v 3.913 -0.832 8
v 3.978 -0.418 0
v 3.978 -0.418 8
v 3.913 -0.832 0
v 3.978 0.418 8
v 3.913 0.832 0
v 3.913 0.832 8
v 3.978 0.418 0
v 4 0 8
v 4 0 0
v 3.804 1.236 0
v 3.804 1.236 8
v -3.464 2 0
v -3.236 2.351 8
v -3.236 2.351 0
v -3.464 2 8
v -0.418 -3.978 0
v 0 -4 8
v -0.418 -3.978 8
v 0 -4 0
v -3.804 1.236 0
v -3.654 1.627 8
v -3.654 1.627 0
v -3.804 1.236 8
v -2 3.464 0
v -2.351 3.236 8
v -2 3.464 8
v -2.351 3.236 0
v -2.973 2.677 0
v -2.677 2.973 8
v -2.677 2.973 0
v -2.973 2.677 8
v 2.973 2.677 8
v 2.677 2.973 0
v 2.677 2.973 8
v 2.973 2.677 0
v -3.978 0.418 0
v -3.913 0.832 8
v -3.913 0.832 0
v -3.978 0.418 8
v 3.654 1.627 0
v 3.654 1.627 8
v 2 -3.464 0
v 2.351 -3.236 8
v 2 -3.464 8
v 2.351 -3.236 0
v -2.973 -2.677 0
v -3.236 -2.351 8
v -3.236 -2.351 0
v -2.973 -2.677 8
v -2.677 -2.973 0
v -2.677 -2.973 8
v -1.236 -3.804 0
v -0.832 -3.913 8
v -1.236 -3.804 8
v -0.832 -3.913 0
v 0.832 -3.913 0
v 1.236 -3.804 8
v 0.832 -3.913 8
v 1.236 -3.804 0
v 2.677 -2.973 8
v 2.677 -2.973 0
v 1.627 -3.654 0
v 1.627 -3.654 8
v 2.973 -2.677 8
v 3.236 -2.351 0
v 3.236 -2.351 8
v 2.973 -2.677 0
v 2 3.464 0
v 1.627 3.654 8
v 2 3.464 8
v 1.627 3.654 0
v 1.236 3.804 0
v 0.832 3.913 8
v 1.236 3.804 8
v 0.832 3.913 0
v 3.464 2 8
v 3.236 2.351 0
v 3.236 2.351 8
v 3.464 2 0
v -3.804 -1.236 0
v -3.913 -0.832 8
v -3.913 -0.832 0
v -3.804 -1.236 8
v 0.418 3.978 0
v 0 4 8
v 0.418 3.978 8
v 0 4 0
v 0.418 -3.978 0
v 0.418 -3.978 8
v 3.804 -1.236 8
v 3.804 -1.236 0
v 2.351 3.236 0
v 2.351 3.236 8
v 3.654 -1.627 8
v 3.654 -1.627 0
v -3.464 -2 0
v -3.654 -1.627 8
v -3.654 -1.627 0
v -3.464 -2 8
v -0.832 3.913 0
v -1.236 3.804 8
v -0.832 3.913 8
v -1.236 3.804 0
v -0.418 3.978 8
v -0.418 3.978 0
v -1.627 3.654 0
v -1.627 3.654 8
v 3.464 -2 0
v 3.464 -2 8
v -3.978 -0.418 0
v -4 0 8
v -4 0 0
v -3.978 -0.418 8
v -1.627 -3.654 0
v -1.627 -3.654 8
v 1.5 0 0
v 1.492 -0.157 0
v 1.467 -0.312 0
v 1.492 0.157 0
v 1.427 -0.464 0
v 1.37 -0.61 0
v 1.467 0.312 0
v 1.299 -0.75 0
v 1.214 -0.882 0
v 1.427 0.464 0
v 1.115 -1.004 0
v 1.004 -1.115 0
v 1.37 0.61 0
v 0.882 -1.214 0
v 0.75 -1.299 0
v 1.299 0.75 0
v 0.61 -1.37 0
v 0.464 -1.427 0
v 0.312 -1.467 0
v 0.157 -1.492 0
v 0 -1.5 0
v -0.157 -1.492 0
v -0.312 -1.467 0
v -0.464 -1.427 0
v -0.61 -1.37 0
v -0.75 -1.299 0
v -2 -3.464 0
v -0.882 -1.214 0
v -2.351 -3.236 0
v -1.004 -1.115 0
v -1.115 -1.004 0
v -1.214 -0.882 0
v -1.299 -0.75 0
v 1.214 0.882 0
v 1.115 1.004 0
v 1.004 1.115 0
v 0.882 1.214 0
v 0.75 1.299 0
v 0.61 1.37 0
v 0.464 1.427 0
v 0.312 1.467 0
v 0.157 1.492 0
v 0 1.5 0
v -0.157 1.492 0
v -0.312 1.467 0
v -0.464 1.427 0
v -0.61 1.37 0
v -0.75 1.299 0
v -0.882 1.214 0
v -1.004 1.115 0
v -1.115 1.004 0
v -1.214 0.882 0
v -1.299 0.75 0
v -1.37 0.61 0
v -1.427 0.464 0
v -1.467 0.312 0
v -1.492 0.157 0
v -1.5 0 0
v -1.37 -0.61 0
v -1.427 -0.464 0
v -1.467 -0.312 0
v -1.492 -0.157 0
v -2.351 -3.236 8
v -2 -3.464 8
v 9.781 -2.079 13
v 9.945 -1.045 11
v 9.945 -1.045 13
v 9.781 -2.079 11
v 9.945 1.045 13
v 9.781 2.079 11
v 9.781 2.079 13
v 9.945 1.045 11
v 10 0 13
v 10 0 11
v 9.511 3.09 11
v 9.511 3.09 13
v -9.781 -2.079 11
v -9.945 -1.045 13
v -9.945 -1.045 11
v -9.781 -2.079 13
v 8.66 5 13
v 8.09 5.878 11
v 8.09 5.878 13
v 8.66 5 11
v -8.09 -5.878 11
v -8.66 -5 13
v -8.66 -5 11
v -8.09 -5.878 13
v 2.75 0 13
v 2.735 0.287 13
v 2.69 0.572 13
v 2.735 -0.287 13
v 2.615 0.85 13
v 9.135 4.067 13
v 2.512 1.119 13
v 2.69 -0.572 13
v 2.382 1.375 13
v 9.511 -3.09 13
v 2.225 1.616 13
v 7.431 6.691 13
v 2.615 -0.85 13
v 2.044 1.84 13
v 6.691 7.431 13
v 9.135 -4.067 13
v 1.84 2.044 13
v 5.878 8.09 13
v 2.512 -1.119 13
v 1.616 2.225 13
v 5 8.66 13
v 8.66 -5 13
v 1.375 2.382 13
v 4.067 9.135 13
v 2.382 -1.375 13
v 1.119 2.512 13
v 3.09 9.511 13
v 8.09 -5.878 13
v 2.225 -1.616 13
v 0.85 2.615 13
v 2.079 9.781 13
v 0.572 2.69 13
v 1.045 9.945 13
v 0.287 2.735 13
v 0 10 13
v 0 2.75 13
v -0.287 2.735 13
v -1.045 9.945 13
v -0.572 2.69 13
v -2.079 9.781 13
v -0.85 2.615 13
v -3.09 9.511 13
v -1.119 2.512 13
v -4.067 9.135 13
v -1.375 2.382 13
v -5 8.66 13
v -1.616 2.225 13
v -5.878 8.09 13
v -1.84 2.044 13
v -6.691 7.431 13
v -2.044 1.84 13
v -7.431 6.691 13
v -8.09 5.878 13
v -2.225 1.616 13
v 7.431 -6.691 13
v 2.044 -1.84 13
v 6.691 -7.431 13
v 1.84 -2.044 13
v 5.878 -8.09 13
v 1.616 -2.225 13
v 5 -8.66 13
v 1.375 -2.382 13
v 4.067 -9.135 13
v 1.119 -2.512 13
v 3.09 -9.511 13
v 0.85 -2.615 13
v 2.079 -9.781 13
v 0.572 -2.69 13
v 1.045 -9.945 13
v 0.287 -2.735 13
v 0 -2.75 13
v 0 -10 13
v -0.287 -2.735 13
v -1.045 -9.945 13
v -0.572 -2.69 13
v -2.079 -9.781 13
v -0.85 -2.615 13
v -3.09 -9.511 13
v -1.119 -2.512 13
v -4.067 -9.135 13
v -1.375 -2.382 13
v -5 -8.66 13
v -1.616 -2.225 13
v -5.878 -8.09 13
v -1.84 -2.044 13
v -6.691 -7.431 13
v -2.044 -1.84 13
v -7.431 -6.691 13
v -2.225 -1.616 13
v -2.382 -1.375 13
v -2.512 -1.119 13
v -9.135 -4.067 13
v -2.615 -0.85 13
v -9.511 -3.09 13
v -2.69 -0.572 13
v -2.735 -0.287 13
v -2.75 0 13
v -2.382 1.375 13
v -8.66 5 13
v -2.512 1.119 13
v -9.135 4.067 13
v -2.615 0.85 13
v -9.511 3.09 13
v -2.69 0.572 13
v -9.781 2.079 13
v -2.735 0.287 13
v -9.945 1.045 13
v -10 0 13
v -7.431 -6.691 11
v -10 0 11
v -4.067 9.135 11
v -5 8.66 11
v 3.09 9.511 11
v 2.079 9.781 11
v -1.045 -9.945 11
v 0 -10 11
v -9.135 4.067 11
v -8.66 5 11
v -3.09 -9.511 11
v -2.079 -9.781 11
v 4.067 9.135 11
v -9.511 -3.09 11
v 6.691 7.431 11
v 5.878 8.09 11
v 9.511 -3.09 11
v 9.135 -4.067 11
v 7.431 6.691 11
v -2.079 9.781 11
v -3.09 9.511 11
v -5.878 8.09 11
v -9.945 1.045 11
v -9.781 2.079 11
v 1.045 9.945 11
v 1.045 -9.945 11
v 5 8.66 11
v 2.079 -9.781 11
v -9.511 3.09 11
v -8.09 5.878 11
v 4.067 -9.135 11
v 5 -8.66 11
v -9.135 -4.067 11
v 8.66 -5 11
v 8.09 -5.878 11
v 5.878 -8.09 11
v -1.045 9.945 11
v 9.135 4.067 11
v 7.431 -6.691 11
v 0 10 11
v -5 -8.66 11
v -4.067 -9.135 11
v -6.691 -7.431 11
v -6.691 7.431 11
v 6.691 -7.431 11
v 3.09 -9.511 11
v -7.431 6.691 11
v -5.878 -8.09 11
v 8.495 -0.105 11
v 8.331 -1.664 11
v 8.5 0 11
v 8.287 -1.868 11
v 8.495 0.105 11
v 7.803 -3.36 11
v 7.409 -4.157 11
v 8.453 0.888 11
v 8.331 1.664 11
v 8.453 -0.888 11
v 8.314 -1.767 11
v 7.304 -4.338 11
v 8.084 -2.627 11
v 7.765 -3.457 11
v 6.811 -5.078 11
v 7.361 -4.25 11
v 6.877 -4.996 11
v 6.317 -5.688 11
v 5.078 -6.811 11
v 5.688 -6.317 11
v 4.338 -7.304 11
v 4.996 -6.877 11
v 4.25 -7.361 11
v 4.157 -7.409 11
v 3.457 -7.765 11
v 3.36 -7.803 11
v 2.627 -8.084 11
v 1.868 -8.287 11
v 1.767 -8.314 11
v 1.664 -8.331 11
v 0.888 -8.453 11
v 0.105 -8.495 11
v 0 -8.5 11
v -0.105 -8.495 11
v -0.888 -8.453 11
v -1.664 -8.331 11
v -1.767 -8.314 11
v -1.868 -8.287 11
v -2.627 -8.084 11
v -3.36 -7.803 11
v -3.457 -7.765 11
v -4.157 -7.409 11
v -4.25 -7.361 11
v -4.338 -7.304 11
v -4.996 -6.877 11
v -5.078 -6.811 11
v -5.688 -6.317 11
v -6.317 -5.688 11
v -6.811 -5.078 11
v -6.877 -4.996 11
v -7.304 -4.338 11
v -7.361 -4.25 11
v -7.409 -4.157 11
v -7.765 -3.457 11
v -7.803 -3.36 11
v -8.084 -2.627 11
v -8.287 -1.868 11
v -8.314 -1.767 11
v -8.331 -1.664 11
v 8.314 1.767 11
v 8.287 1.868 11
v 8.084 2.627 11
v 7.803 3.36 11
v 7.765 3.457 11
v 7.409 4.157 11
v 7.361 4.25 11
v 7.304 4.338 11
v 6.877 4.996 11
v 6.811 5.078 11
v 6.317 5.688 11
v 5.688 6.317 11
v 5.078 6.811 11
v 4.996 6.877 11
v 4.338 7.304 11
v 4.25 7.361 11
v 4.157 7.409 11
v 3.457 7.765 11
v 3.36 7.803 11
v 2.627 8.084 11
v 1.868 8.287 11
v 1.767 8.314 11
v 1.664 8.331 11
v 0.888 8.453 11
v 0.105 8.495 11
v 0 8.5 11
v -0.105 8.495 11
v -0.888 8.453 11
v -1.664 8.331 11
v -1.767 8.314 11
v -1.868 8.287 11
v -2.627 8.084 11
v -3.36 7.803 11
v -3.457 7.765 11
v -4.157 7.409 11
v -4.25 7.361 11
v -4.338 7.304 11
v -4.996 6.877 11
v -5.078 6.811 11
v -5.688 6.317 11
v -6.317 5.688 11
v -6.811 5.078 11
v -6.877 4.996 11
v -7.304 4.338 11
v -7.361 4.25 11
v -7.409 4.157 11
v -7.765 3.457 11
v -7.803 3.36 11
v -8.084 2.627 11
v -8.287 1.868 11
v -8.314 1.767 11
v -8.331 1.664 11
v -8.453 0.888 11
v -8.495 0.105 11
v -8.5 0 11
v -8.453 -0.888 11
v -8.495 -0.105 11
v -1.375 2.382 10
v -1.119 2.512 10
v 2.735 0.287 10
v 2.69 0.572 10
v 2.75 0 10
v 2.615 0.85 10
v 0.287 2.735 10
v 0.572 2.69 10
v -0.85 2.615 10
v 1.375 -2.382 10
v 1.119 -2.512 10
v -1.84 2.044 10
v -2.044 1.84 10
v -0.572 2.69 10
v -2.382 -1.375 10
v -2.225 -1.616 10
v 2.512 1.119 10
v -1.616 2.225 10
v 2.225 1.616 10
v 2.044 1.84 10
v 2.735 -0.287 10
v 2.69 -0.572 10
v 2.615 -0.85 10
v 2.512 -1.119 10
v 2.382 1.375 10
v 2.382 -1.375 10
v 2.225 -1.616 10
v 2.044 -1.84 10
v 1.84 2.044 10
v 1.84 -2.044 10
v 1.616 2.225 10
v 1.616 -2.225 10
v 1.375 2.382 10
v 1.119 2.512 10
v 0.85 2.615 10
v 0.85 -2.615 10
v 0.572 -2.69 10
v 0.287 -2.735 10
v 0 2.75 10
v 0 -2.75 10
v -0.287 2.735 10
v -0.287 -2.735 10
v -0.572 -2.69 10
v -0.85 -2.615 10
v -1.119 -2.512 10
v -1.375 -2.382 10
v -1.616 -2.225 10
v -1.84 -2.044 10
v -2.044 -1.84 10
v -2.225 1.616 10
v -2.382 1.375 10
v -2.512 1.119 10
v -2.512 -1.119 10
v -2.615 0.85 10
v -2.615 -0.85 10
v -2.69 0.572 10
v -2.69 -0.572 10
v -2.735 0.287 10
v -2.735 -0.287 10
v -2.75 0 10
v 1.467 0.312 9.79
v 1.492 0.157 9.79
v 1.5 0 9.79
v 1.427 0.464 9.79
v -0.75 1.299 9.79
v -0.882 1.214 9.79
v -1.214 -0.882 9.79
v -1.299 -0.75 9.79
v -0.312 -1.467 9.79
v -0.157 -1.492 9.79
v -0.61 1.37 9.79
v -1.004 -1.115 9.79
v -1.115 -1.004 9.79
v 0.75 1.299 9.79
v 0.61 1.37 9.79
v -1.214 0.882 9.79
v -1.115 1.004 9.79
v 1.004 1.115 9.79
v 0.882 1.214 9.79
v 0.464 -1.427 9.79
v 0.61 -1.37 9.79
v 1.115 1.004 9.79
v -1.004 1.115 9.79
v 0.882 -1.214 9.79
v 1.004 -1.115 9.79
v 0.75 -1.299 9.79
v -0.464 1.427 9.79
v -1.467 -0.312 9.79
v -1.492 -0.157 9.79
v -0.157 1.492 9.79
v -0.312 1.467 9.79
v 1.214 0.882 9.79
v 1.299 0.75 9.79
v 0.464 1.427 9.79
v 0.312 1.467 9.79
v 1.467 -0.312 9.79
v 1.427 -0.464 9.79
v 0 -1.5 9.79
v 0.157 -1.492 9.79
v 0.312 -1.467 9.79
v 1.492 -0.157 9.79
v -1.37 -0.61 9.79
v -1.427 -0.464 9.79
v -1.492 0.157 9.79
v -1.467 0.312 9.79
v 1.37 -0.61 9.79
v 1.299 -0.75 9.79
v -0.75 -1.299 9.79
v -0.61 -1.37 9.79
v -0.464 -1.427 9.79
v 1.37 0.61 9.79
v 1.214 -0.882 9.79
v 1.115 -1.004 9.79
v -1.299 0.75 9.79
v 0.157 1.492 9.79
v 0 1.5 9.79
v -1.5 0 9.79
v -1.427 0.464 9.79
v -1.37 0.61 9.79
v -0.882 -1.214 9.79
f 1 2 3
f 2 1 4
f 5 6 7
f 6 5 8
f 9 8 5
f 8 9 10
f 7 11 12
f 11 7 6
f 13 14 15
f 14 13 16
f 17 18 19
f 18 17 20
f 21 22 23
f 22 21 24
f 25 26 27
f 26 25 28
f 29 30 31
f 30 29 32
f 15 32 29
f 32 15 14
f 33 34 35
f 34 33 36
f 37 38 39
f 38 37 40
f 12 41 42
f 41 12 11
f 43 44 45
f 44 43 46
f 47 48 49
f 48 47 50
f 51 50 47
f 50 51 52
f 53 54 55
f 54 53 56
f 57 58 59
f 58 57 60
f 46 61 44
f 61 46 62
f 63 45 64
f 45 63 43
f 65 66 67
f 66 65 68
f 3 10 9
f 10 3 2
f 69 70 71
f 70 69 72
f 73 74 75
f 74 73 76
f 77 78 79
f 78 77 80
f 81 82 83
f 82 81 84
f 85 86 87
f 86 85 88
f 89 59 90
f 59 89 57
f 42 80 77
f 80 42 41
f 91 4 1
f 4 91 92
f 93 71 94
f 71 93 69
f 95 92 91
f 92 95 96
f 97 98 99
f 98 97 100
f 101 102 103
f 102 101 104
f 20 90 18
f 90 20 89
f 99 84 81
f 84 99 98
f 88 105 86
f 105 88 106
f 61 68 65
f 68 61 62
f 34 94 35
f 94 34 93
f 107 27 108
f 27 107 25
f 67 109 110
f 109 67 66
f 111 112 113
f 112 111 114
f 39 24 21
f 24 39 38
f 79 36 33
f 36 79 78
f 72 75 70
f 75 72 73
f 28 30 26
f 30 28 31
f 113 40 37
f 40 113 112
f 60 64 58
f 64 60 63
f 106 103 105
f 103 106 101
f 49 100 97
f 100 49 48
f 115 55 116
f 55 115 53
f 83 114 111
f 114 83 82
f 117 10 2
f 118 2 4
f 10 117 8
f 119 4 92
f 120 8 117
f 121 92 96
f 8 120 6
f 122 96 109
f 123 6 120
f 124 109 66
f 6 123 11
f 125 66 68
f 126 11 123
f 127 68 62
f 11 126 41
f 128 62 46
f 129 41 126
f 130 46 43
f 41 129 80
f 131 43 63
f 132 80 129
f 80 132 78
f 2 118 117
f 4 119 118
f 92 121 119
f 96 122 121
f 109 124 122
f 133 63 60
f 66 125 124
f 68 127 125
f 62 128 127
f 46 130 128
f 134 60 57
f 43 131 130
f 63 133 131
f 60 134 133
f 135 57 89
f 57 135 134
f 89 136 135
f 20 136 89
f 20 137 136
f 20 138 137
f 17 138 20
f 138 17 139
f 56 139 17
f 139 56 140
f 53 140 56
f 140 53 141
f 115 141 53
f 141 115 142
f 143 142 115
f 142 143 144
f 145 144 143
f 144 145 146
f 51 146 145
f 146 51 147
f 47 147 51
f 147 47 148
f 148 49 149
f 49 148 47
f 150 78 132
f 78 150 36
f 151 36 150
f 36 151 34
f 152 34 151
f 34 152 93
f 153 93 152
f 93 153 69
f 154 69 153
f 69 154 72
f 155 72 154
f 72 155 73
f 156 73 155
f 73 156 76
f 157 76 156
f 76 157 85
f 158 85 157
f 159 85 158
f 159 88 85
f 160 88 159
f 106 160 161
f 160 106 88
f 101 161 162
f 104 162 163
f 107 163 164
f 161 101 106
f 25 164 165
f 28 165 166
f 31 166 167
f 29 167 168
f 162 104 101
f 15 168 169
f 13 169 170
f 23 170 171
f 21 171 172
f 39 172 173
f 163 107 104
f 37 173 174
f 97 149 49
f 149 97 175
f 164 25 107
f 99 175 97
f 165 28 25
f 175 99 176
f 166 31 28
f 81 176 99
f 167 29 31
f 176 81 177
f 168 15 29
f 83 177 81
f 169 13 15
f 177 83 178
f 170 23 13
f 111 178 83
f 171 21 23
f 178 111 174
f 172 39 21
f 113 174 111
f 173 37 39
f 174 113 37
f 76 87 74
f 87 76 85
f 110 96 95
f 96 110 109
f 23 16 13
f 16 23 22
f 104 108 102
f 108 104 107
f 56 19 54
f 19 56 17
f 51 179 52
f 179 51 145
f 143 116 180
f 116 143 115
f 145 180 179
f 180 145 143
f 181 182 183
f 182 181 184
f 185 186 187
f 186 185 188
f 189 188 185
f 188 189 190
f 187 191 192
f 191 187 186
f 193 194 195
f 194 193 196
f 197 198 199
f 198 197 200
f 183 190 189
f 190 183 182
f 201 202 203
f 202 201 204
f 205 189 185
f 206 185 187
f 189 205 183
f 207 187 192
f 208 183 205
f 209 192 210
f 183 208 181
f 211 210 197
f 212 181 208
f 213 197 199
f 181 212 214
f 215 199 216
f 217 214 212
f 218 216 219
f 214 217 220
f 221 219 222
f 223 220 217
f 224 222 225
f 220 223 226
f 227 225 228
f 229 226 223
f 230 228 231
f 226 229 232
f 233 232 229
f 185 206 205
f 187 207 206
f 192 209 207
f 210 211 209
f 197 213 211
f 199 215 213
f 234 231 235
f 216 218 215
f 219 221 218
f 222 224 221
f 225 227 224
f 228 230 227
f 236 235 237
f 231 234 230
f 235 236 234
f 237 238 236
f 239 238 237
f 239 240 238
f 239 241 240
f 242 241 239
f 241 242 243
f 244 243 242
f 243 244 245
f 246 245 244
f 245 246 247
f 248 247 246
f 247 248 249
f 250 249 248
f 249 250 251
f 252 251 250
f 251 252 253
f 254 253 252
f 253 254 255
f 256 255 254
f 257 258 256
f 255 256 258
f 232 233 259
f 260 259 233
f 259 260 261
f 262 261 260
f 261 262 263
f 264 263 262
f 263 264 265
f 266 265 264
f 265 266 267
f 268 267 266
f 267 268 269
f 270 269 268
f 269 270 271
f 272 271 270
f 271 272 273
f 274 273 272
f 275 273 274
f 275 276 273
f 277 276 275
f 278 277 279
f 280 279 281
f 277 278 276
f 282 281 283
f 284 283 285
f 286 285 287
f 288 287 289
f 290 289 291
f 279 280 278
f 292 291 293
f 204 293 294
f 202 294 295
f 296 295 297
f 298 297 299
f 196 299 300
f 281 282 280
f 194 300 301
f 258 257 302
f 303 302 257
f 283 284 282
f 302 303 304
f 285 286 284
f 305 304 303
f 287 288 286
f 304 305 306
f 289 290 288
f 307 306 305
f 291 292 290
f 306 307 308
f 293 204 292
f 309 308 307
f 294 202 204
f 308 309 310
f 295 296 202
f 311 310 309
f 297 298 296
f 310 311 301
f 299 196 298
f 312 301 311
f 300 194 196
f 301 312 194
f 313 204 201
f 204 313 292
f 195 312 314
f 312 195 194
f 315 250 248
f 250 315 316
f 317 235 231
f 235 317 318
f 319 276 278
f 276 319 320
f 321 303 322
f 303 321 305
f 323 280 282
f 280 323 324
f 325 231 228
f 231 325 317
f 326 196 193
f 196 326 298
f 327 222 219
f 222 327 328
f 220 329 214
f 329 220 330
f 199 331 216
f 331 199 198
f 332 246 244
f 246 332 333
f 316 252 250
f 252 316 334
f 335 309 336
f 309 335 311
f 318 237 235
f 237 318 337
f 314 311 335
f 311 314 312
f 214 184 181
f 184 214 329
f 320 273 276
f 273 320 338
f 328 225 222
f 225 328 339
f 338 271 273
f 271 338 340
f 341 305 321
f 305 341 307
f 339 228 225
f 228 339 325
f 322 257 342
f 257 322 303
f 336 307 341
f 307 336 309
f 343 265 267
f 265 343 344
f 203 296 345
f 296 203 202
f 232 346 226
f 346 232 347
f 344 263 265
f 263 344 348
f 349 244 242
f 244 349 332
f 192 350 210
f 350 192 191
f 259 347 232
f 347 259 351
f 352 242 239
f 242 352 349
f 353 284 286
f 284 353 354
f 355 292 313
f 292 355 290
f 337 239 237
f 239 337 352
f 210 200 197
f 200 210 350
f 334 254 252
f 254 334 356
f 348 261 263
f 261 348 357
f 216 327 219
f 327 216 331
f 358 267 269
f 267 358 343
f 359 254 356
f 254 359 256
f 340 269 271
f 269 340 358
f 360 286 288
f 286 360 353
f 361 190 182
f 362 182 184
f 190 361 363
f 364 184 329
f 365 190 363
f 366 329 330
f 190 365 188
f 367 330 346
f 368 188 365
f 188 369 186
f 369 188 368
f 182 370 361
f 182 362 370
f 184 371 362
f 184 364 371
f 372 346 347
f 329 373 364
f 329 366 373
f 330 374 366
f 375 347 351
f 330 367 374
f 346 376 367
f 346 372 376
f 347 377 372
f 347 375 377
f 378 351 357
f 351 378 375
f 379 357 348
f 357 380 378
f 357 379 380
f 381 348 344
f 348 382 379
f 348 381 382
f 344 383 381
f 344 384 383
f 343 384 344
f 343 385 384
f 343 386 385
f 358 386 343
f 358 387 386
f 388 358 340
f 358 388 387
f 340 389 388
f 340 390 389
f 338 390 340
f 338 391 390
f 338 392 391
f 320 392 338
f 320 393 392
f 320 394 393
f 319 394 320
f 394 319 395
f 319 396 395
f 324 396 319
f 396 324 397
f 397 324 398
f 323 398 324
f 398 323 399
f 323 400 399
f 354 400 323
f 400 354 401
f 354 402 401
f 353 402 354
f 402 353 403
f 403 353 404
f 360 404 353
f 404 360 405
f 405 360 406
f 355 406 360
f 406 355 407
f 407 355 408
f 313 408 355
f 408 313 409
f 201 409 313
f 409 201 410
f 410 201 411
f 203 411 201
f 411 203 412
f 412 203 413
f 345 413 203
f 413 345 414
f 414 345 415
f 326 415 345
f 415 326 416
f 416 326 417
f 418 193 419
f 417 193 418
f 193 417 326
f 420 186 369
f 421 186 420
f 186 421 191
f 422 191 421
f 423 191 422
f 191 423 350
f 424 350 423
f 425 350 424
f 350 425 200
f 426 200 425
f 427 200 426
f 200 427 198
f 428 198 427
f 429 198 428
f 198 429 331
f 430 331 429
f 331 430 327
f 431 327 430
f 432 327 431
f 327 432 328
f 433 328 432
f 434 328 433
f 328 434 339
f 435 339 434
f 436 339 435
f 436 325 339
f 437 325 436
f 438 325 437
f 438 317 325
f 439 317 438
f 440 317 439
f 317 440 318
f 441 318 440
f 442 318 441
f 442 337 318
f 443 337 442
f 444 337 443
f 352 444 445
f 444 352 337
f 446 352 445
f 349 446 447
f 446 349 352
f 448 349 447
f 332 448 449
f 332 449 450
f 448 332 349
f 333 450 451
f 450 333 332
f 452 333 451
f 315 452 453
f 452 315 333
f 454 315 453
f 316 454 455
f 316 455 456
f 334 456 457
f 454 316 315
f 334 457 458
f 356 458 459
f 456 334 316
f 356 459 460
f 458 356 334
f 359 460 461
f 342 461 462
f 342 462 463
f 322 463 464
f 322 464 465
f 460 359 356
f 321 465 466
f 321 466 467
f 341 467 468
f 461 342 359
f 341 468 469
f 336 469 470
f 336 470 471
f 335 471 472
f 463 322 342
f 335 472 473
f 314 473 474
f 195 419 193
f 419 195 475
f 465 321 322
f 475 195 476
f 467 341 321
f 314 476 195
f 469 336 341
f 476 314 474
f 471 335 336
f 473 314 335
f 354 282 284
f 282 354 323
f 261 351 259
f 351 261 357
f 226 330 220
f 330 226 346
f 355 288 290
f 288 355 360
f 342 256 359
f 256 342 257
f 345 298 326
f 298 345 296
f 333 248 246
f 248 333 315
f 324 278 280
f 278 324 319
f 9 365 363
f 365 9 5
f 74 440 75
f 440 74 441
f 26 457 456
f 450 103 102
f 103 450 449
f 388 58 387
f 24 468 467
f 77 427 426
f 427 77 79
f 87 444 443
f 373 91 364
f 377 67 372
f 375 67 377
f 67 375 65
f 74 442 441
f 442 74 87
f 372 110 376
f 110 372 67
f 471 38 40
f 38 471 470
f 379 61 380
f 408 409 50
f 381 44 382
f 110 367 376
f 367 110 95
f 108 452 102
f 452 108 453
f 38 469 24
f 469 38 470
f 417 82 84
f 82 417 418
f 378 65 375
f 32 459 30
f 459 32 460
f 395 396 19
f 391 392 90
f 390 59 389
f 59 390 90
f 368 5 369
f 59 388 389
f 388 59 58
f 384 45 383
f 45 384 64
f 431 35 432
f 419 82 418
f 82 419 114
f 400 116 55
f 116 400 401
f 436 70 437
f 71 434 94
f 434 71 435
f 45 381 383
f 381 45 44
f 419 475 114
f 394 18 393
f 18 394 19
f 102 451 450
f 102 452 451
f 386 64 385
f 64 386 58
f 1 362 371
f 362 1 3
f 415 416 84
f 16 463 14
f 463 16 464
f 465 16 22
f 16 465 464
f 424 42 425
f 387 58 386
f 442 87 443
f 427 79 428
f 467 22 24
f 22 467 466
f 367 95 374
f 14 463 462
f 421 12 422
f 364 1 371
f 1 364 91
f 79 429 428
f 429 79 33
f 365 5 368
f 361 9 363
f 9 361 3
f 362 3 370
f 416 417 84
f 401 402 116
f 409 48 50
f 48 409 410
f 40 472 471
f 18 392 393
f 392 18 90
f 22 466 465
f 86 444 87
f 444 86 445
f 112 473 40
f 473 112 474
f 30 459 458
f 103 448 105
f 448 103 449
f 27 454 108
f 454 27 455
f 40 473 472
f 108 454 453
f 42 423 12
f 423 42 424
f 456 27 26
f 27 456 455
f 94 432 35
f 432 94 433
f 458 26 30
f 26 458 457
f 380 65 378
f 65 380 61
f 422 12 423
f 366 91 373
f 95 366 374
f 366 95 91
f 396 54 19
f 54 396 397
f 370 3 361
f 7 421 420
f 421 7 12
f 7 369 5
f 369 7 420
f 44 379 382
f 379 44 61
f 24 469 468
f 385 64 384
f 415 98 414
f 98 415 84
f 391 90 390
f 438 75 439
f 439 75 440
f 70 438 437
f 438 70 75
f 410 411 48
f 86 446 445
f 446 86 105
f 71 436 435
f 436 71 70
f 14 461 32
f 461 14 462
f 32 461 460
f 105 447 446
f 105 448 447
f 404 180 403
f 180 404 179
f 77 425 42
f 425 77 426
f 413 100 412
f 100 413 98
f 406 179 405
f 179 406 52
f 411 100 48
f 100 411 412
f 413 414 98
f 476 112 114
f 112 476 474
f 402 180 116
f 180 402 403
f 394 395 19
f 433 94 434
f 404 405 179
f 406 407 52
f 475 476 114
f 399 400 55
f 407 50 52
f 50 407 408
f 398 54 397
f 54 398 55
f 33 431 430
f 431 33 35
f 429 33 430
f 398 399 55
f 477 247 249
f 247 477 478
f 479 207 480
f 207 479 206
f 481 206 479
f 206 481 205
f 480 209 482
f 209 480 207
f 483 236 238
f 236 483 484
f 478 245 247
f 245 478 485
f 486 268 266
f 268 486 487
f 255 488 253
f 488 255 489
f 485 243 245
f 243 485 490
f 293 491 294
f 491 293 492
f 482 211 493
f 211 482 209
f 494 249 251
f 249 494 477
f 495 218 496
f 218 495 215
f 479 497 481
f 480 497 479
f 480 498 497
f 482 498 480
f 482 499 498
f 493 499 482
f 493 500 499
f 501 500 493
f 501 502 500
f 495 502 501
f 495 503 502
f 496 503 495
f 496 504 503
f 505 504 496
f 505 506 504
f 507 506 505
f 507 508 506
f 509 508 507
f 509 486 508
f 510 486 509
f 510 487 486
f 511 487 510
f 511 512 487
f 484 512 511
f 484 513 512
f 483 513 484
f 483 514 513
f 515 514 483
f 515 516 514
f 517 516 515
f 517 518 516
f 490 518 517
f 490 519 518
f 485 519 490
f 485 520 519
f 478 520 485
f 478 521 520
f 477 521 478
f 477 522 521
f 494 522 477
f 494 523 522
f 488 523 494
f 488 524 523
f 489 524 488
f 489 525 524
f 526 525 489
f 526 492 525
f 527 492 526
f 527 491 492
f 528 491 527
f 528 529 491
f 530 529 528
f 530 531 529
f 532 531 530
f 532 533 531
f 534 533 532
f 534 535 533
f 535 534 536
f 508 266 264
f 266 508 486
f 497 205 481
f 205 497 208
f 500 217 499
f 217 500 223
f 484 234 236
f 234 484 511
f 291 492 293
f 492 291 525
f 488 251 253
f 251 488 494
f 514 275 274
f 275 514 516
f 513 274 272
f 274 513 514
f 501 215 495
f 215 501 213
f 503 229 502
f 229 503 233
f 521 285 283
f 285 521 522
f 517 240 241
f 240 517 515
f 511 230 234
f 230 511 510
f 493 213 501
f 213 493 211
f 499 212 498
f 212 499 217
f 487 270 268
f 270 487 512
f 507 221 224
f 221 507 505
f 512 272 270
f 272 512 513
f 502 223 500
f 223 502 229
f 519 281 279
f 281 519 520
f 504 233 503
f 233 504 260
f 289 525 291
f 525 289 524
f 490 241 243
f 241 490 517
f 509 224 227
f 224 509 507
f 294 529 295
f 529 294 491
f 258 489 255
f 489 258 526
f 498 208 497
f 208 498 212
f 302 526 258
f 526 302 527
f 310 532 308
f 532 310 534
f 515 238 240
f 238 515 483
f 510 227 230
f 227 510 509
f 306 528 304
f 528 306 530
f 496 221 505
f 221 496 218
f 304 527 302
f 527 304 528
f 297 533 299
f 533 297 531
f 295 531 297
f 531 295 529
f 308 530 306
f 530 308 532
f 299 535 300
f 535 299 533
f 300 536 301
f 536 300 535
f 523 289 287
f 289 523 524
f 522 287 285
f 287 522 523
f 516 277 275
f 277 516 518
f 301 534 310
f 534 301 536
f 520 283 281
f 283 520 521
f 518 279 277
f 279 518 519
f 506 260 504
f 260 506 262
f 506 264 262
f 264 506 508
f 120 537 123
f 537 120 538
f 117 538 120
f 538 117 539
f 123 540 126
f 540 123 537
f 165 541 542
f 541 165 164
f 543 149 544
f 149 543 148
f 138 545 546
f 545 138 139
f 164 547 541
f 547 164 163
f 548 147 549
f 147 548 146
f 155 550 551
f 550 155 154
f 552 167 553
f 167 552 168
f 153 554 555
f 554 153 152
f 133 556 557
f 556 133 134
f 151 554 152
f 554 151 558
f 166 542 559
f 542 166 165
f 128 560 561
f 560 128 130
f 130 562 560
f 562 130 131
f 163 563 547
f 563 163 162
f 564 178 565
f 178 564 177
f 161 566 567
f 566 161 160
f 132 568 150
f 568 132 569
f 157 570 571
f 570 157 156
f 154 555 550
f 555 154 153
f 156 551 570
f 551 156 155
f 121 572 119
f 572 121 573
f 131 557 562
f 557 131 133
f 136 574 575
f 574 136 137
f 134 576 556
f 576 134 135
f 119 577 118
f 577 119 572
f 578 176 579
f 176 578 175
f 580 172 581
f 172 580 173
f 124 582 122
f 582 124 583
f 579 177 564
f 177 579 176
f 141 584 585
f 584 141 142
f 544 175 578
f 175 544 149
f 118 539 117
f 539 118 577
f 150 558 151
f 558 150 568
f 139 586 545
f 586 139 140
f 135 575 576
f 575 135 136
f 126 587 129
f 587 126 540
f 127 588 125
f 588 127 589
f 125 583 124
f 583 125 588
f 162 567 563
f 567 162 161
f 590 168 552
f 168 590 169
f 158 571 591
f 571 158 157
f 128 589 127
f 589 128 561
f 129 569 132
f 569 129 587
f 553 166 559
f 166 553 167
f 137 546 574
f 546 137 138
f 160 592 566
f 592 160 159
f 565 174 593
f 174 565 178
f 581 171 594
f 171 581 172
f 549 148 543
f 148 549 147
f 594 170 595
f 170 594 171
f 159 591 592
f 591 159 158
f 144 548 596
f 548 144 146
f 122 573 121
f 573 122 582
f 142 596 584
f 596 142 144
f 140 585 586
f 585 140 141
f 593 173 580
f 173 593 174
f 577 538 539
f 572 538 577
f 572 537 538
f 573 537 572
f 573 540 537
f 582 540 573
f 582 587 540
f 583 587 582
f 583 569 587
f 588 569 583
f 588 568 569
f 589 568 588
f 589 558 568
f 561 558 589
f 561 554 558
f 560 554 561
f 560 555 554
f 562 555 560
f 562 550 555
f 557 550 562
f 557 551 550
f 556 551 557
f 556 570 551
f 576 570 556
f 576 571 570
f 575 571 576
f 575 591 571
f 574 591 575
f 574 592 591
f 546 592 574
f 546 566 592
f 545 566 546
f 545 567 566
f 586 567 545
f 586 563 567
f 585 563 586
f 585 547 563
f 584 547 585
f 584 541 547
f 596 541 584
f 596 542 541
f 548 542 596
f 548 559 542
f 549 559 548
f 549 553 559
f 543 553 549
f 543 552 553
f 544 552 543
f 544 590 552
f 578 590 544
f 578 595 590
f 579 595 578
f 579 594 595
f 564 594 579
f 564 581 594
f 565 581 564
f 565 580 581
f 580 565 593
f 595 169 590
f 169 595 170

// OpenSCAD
//import("D:/OneDrive/Identity/AS/autonomus-only-logo.svg",center=true,96);
module logo(h) {
  a=0.16;
scale([a,a,1])linear_extrude(height=h)translate([8,3])import("d:\\Downloads\\autonomus-only-logo-_1_.svg",center=true );
}
module logo2(h) {
  a=0.16;
  minkowski() {  
scale([a,a,1])linear_extrude(height=h-2)translate([8,3])
    import("d:\\Downloads\\autonomus-only-logo-_1_.svg",center=true );
    cylinder(d1=0.5,d2=0,h=2);
  }
}

module logo_blees(h) {
  b=5.0;
  w=0.9;
  mirror([1,0])minkowski() {  
  scale([b,b,1])linear_extrude(height=h-2)translate([-2.3,-2.3])
    union() {
      translate([0,0])square([4.9,w]);
      translate([2.3,2.4])square([2.6,w]);
      translate([2.3,2.4])square([w,2.5]);
      translate([0,4])square([2.5,w]);
      translate([4,0])square([w,2.5]);
    }
    cylinder(d1=0.5,d2=0,h=2);
  }
}

module stamp_as() {
  difference() {
    union() {
      rotate([0,0,45/2])cylinder(d=50,h=5,$fn=8);
      logo(7);
    }
    translate([0,0,-.01])cylinder(d=2.7,h=4.5,$fn=24);
  }
}
module case() {
  difference() {
    rotate([0,0,45/2]) hull() {
      cylinder(d=51.5,h=1+7+7,$fn=8);
      cylinder(d=53,h=1+7+7-5,$fn=8);
    }
    translate([0,0,1])rotate([0,0,45/2])cylinder(d=50.2,h=20,$fn=8);
    cylinder(d=3,h=50,center=true,$fn=24);
  }
}
module stamp_as2() {
  difference() {
    union() {
      rotate([0,0,45/2])cylinder(d=50,h=5,$fn=8);
      logo2(7);
    }
    translate([0,0,-.01])cylinder(d=2.7,h=4.5,$fn=24);
  }
}

module stamp_blees() {
  difference() {
    union() {
      rotate([0,0,45/2])cylinder(d=50,h=5,$fn=8);
      logo_blees(7);
    }
    translate([0,0,-.01])cylinder(d=2.7,h=4.5,$fn=24);
  }
}

module handle_part1() {
  h1=10;
  h2=3;
  h3=2;
  difference() {
    union() {
      cylinder(d=8,h=h1,$fn=60);
      translate([0,0,h1+h2-h3])cylinder(d=20,h=h3,$fn=60);
      translate([0,0,h1+h2-h3-3])cylinder(d1=8,d2=20,h=4,$fn=60);
    }
    translate([0,0,h1])cylinder(d=5.5,h=10,$fn=60);
    translate([0,0,-.01])cylinder(d=3,h=h1-0.2,$fn=60);
  }
}
module handle_part2() {
  h=2;
  translate([0,0,15])mirror([0,0,1])difference() {
    union() {
      cylinder(d1=28,d2=30,h=1.01,$fn=60);
      translate([0,0,1])cylinder(d=30,h=1.01,$fn=60);
      translate([0,0,2]) {
        difference() {
          union() {
            cylinder(d=30,h=h-0.99,$fn=60);
            translate([0,0,h-1])cylinder(d1=30,d2=28,h=1,$fn=60);
          }
          cylinder(d=20,h=10,$fn=60);
        }
      }
      //cylinder(d=8,h=5,$fn=60);
      //cylinder(d=8,h=5,$fn=60);
      //translate([0,0,4])cylinder(d=20,h=1,$fn=60);
    }
    translate([0,0,-.01])cylinder(d=3,h=20,$fn=60);
  }
}

//case();
//stamp_as2();
//stamp_blees();
handle_part1();
//handle_part2();
